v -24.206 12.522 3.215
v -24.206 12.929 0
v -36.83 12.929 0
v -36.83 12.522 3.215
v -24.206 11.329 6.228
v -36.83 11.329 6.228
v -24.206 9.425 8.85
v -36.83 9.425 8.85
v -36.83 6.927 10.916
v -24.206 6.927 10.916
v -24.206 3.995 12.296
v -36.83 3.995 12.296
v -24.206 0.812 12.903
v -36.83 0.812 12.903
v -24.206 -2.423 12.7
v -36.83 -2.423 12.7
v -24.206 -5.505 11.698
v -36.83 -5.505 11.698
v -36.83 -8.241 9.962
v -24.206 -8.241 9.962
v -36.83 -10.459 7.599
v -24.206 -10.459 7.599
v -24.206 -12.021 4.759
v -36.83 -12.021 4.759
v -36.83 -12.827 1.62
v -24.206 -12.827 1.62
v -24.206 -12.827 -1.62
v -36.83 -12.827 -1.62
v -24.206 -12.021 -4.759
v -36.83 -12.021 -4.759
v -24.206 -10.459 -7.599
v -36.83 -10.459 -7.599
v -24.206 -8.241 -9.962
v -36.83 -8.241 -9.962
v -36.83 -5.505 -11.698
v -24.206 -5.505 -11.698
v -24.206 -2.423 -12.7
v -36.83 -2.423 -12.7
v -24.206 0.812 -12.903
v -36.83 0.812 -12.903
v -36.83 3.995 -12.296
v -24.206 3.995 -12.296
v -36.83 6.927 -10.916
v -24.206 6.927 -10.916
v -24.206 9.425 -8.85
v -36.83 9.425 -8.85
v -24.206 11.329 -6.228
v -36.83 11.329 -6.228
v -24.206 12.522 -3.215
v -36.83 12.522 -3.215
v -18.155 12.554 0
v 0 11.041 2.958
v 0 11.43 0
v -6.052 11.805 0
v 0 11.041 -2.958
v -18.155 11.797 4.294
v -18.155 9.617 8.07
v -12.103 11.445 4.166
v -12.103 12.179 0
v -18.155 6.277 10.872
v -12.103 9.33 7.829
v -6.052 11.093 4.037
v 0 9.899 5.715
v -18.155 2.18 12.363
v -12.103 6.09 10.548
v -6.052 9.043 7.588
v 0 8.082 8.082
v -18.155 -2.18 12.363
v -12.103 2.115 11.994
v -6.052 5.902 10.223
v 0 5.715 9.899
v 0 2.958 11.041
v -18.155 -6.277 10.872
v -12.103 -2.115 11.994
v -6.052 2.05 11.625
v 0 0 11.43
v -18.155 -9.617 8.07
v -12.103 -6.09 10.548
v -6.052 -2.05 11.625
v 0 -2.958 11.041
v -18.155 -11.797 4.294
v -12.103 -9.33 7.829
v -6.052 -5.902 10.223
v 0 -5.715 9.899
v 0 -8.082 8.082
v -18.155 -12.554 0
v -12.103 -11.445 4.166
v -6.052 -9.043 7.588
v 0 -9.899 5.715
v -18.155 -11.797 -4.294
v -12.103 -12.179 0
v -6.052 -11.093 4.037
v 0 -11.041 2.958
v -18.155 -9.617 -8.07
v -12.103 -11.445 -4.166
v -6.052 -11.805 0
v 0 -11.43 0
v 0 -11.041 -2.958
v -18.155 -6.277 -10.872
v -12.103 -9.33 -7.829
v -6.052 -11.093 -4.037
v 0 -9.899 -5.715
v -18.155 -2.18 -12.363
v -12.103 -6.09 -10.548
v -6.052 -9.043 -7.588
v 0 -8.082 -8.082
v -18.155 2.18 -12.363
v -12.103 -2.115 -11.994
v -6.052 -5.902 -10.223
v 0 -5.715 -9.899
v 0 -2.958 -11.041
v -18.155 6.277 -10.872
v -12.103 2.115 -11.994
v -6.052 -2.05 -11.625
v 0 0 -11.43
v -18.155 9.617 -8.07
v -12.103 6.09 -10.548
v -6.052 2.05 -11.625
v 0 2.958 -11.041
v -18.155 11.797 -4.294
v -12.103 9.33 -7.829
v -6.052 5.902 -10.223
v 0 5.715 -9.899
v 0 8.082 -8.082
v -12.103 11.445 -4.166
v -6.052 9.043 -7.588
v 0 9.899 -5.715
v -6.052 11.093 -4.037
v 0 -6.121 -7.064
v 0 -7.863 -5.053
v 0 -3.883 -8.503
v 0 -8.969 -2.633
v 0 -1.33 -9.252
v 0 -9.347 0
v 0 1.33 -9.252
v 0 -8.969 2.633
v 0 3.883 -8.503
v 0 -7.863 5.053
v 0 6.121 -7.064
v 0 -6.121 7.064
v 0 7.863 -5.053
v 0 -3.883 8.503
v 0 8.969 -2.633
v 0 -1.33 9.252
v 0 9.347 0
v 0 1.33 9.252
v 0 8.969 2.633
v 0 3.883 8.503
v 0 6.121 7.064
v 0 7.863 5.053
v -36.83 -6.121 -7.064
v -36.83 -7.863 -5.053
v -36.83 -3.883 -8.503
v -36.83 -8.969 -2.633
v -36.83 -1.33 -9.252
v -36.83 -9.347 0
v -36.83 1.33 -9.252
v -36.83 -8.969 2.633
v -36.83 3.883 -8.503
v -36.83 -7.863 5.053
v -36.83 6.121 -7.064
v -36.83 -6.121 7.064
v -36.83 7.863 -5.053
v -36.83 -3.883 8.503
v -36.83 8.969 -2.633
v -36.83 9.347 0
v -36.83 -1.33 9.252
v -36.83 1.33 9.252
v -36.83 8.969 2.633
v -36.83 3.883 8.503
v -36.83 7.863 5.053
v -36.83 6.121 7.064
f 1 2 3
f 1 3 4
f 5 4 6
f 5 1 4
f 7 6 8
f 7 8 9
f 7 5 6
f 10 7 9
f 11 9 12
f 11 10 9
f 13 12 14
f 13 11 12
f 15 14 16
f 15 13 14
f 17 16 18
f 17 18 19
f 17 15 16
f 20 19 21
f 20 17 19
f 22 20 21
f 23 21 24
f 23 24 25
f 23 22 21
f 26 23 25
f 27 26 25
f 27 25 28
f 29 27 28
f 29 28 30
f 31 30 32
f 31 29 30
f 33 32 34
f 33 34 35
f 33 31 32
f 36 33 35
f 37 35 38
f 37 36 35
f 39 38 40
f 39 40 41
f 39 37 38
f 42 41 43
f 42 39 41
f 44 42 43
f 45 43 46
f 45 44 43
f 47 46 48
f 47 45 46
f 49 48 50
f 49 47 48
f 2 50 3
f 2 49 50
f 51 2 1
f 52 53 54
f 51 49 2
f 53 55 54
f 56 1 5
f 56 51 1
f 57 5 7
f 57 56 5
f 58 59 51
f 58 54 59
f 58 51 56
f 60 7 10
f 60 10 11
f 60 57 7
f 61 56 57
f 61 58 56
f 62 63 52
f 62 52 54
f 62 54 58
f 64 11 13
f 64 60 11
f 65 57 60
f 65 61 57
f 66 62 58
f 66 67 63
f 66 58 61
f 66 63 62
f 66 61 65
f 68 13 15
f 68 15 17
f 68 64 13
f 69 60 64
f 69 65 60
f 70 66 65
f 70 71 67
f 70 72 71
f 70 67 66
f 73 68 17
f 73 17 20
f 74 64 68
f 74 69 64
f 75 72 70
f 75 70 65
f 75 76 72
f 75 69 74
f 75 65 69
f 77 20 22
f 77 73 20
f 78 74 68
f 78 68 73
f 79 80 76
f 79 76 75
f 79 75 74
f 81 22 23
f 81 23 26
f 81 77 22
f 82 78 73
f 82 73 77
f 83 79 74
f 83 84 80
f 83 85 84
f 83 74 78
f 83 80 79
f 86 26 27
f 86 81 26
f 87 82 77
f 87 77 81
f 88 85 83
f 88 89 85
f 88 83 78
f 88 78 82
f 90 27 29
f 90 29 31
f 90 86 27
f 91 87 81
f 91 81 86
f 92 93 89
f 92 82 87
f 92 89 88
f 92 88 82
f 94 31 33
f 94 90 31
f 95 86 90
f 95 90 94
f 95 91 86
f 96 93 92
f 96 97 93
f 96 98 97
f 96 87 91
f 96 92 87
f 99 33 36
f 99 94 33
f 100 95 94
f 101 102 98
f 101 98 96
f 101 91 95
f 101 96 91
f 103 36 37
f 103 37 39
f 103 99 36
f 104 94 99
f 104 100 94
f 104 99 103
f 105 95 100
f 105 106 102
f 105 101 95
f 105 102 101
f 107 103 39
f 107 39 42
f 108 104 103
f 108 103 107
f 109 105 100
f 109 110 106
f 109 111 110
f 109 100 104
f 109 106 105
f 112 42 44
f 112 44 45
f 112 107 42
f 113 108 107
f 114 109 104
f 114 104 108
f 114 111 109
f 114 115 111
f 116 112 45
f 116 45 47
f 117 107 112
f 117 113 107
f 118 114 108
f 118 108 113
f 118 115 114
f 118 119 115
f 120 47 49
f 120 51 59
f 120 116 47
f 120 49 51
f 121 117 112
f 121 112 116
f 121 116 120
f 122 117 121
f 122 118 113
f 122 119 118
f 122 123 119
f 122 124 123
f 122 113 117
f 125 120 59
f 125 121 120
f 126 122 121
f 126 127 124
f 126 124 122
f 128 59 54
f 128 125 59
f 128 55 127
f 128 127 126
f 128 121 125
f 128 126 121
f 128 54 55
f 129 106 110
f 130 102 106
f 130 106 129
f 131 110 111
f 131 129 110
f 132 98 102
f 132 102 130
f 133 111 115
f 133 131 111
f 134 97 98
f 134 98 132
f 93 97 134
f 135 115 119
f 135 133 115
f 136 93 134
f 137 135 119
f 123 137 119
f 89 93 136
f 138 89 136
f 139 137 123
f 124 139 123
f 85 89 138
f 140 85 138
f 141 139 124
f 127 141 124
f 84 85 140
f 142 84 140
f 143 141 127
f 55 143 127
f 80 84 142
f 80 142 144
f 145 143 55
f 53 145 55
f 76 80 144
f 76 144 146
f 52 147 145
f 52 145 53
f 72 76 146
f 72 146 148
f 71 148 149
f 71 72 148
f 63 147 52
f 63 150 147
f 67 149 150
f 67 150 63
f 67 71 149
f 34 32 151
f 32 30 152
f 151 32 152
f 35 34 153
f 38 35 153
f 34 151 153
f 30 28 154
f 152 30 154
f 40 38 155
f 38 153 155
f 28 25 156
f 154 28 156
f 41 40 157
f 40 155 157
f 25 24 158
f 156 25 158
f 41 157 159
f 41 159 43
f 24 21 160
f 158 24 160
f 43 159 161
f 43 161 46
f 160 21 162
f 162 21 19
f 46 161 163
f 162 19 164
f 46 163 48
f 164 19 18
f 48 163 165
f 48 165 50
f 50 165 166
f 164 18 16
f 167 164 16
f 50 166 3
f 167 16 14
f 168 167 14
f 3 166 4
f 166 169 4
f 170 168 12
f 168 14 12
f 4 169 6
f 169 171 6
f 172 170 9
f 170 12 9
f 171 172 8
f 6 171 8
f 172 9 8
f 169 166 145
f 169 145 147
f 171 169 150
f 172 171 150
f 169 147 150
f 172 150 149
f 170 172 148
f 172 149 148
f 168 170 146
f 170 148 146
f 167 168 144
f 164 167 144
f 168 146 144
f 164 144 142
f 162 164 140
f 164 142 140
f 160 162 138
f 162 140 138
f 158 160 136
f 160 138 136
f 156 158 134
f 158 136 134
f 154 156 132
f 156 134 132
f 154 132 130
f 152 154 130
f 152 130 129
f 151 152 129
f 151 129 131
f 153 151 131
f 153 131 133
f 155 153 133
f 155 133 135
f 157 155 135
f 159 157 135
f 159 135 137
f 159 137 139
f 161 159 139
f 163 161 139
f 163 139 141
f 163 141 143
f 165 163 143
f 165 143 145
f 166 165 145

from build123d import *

# Parameters (mm, degrees)
F2_R      = 12.9286
F3_DEPTH  = 12.6238
F3_FACE_R = 12.9286
F0_R      = 11.43
F5_R      = 9.3472
F6_DEPTH  = 36.831


with BuildPart() as f3:
    # F2 (on offset) → F3 (new body)
    with BuildSketch(Plane.YZ.offset(-24.2062)):
        Circle(F2_R)
    extrude(amount=-F3_DEPTH)

    # F3_face (on face) → F4 section 0
    with BuildSketch(Plane.YZ.offset(-24.2062)):
        Circle(F3_FACE_R)
    # F0 (on Right) → F4 section 1
    with BuildSketch(Plane.YZ):
        Circle(F0_R)
    loft()

    # F5 (on face) → F6 (cut, through all)
    with BuildSketch(Plane.YZ):
        Circle(F5_R)
    extrude(amount=-F6_DEPTH, mode=Mode.SUBTRACT)


solid = f3.part
